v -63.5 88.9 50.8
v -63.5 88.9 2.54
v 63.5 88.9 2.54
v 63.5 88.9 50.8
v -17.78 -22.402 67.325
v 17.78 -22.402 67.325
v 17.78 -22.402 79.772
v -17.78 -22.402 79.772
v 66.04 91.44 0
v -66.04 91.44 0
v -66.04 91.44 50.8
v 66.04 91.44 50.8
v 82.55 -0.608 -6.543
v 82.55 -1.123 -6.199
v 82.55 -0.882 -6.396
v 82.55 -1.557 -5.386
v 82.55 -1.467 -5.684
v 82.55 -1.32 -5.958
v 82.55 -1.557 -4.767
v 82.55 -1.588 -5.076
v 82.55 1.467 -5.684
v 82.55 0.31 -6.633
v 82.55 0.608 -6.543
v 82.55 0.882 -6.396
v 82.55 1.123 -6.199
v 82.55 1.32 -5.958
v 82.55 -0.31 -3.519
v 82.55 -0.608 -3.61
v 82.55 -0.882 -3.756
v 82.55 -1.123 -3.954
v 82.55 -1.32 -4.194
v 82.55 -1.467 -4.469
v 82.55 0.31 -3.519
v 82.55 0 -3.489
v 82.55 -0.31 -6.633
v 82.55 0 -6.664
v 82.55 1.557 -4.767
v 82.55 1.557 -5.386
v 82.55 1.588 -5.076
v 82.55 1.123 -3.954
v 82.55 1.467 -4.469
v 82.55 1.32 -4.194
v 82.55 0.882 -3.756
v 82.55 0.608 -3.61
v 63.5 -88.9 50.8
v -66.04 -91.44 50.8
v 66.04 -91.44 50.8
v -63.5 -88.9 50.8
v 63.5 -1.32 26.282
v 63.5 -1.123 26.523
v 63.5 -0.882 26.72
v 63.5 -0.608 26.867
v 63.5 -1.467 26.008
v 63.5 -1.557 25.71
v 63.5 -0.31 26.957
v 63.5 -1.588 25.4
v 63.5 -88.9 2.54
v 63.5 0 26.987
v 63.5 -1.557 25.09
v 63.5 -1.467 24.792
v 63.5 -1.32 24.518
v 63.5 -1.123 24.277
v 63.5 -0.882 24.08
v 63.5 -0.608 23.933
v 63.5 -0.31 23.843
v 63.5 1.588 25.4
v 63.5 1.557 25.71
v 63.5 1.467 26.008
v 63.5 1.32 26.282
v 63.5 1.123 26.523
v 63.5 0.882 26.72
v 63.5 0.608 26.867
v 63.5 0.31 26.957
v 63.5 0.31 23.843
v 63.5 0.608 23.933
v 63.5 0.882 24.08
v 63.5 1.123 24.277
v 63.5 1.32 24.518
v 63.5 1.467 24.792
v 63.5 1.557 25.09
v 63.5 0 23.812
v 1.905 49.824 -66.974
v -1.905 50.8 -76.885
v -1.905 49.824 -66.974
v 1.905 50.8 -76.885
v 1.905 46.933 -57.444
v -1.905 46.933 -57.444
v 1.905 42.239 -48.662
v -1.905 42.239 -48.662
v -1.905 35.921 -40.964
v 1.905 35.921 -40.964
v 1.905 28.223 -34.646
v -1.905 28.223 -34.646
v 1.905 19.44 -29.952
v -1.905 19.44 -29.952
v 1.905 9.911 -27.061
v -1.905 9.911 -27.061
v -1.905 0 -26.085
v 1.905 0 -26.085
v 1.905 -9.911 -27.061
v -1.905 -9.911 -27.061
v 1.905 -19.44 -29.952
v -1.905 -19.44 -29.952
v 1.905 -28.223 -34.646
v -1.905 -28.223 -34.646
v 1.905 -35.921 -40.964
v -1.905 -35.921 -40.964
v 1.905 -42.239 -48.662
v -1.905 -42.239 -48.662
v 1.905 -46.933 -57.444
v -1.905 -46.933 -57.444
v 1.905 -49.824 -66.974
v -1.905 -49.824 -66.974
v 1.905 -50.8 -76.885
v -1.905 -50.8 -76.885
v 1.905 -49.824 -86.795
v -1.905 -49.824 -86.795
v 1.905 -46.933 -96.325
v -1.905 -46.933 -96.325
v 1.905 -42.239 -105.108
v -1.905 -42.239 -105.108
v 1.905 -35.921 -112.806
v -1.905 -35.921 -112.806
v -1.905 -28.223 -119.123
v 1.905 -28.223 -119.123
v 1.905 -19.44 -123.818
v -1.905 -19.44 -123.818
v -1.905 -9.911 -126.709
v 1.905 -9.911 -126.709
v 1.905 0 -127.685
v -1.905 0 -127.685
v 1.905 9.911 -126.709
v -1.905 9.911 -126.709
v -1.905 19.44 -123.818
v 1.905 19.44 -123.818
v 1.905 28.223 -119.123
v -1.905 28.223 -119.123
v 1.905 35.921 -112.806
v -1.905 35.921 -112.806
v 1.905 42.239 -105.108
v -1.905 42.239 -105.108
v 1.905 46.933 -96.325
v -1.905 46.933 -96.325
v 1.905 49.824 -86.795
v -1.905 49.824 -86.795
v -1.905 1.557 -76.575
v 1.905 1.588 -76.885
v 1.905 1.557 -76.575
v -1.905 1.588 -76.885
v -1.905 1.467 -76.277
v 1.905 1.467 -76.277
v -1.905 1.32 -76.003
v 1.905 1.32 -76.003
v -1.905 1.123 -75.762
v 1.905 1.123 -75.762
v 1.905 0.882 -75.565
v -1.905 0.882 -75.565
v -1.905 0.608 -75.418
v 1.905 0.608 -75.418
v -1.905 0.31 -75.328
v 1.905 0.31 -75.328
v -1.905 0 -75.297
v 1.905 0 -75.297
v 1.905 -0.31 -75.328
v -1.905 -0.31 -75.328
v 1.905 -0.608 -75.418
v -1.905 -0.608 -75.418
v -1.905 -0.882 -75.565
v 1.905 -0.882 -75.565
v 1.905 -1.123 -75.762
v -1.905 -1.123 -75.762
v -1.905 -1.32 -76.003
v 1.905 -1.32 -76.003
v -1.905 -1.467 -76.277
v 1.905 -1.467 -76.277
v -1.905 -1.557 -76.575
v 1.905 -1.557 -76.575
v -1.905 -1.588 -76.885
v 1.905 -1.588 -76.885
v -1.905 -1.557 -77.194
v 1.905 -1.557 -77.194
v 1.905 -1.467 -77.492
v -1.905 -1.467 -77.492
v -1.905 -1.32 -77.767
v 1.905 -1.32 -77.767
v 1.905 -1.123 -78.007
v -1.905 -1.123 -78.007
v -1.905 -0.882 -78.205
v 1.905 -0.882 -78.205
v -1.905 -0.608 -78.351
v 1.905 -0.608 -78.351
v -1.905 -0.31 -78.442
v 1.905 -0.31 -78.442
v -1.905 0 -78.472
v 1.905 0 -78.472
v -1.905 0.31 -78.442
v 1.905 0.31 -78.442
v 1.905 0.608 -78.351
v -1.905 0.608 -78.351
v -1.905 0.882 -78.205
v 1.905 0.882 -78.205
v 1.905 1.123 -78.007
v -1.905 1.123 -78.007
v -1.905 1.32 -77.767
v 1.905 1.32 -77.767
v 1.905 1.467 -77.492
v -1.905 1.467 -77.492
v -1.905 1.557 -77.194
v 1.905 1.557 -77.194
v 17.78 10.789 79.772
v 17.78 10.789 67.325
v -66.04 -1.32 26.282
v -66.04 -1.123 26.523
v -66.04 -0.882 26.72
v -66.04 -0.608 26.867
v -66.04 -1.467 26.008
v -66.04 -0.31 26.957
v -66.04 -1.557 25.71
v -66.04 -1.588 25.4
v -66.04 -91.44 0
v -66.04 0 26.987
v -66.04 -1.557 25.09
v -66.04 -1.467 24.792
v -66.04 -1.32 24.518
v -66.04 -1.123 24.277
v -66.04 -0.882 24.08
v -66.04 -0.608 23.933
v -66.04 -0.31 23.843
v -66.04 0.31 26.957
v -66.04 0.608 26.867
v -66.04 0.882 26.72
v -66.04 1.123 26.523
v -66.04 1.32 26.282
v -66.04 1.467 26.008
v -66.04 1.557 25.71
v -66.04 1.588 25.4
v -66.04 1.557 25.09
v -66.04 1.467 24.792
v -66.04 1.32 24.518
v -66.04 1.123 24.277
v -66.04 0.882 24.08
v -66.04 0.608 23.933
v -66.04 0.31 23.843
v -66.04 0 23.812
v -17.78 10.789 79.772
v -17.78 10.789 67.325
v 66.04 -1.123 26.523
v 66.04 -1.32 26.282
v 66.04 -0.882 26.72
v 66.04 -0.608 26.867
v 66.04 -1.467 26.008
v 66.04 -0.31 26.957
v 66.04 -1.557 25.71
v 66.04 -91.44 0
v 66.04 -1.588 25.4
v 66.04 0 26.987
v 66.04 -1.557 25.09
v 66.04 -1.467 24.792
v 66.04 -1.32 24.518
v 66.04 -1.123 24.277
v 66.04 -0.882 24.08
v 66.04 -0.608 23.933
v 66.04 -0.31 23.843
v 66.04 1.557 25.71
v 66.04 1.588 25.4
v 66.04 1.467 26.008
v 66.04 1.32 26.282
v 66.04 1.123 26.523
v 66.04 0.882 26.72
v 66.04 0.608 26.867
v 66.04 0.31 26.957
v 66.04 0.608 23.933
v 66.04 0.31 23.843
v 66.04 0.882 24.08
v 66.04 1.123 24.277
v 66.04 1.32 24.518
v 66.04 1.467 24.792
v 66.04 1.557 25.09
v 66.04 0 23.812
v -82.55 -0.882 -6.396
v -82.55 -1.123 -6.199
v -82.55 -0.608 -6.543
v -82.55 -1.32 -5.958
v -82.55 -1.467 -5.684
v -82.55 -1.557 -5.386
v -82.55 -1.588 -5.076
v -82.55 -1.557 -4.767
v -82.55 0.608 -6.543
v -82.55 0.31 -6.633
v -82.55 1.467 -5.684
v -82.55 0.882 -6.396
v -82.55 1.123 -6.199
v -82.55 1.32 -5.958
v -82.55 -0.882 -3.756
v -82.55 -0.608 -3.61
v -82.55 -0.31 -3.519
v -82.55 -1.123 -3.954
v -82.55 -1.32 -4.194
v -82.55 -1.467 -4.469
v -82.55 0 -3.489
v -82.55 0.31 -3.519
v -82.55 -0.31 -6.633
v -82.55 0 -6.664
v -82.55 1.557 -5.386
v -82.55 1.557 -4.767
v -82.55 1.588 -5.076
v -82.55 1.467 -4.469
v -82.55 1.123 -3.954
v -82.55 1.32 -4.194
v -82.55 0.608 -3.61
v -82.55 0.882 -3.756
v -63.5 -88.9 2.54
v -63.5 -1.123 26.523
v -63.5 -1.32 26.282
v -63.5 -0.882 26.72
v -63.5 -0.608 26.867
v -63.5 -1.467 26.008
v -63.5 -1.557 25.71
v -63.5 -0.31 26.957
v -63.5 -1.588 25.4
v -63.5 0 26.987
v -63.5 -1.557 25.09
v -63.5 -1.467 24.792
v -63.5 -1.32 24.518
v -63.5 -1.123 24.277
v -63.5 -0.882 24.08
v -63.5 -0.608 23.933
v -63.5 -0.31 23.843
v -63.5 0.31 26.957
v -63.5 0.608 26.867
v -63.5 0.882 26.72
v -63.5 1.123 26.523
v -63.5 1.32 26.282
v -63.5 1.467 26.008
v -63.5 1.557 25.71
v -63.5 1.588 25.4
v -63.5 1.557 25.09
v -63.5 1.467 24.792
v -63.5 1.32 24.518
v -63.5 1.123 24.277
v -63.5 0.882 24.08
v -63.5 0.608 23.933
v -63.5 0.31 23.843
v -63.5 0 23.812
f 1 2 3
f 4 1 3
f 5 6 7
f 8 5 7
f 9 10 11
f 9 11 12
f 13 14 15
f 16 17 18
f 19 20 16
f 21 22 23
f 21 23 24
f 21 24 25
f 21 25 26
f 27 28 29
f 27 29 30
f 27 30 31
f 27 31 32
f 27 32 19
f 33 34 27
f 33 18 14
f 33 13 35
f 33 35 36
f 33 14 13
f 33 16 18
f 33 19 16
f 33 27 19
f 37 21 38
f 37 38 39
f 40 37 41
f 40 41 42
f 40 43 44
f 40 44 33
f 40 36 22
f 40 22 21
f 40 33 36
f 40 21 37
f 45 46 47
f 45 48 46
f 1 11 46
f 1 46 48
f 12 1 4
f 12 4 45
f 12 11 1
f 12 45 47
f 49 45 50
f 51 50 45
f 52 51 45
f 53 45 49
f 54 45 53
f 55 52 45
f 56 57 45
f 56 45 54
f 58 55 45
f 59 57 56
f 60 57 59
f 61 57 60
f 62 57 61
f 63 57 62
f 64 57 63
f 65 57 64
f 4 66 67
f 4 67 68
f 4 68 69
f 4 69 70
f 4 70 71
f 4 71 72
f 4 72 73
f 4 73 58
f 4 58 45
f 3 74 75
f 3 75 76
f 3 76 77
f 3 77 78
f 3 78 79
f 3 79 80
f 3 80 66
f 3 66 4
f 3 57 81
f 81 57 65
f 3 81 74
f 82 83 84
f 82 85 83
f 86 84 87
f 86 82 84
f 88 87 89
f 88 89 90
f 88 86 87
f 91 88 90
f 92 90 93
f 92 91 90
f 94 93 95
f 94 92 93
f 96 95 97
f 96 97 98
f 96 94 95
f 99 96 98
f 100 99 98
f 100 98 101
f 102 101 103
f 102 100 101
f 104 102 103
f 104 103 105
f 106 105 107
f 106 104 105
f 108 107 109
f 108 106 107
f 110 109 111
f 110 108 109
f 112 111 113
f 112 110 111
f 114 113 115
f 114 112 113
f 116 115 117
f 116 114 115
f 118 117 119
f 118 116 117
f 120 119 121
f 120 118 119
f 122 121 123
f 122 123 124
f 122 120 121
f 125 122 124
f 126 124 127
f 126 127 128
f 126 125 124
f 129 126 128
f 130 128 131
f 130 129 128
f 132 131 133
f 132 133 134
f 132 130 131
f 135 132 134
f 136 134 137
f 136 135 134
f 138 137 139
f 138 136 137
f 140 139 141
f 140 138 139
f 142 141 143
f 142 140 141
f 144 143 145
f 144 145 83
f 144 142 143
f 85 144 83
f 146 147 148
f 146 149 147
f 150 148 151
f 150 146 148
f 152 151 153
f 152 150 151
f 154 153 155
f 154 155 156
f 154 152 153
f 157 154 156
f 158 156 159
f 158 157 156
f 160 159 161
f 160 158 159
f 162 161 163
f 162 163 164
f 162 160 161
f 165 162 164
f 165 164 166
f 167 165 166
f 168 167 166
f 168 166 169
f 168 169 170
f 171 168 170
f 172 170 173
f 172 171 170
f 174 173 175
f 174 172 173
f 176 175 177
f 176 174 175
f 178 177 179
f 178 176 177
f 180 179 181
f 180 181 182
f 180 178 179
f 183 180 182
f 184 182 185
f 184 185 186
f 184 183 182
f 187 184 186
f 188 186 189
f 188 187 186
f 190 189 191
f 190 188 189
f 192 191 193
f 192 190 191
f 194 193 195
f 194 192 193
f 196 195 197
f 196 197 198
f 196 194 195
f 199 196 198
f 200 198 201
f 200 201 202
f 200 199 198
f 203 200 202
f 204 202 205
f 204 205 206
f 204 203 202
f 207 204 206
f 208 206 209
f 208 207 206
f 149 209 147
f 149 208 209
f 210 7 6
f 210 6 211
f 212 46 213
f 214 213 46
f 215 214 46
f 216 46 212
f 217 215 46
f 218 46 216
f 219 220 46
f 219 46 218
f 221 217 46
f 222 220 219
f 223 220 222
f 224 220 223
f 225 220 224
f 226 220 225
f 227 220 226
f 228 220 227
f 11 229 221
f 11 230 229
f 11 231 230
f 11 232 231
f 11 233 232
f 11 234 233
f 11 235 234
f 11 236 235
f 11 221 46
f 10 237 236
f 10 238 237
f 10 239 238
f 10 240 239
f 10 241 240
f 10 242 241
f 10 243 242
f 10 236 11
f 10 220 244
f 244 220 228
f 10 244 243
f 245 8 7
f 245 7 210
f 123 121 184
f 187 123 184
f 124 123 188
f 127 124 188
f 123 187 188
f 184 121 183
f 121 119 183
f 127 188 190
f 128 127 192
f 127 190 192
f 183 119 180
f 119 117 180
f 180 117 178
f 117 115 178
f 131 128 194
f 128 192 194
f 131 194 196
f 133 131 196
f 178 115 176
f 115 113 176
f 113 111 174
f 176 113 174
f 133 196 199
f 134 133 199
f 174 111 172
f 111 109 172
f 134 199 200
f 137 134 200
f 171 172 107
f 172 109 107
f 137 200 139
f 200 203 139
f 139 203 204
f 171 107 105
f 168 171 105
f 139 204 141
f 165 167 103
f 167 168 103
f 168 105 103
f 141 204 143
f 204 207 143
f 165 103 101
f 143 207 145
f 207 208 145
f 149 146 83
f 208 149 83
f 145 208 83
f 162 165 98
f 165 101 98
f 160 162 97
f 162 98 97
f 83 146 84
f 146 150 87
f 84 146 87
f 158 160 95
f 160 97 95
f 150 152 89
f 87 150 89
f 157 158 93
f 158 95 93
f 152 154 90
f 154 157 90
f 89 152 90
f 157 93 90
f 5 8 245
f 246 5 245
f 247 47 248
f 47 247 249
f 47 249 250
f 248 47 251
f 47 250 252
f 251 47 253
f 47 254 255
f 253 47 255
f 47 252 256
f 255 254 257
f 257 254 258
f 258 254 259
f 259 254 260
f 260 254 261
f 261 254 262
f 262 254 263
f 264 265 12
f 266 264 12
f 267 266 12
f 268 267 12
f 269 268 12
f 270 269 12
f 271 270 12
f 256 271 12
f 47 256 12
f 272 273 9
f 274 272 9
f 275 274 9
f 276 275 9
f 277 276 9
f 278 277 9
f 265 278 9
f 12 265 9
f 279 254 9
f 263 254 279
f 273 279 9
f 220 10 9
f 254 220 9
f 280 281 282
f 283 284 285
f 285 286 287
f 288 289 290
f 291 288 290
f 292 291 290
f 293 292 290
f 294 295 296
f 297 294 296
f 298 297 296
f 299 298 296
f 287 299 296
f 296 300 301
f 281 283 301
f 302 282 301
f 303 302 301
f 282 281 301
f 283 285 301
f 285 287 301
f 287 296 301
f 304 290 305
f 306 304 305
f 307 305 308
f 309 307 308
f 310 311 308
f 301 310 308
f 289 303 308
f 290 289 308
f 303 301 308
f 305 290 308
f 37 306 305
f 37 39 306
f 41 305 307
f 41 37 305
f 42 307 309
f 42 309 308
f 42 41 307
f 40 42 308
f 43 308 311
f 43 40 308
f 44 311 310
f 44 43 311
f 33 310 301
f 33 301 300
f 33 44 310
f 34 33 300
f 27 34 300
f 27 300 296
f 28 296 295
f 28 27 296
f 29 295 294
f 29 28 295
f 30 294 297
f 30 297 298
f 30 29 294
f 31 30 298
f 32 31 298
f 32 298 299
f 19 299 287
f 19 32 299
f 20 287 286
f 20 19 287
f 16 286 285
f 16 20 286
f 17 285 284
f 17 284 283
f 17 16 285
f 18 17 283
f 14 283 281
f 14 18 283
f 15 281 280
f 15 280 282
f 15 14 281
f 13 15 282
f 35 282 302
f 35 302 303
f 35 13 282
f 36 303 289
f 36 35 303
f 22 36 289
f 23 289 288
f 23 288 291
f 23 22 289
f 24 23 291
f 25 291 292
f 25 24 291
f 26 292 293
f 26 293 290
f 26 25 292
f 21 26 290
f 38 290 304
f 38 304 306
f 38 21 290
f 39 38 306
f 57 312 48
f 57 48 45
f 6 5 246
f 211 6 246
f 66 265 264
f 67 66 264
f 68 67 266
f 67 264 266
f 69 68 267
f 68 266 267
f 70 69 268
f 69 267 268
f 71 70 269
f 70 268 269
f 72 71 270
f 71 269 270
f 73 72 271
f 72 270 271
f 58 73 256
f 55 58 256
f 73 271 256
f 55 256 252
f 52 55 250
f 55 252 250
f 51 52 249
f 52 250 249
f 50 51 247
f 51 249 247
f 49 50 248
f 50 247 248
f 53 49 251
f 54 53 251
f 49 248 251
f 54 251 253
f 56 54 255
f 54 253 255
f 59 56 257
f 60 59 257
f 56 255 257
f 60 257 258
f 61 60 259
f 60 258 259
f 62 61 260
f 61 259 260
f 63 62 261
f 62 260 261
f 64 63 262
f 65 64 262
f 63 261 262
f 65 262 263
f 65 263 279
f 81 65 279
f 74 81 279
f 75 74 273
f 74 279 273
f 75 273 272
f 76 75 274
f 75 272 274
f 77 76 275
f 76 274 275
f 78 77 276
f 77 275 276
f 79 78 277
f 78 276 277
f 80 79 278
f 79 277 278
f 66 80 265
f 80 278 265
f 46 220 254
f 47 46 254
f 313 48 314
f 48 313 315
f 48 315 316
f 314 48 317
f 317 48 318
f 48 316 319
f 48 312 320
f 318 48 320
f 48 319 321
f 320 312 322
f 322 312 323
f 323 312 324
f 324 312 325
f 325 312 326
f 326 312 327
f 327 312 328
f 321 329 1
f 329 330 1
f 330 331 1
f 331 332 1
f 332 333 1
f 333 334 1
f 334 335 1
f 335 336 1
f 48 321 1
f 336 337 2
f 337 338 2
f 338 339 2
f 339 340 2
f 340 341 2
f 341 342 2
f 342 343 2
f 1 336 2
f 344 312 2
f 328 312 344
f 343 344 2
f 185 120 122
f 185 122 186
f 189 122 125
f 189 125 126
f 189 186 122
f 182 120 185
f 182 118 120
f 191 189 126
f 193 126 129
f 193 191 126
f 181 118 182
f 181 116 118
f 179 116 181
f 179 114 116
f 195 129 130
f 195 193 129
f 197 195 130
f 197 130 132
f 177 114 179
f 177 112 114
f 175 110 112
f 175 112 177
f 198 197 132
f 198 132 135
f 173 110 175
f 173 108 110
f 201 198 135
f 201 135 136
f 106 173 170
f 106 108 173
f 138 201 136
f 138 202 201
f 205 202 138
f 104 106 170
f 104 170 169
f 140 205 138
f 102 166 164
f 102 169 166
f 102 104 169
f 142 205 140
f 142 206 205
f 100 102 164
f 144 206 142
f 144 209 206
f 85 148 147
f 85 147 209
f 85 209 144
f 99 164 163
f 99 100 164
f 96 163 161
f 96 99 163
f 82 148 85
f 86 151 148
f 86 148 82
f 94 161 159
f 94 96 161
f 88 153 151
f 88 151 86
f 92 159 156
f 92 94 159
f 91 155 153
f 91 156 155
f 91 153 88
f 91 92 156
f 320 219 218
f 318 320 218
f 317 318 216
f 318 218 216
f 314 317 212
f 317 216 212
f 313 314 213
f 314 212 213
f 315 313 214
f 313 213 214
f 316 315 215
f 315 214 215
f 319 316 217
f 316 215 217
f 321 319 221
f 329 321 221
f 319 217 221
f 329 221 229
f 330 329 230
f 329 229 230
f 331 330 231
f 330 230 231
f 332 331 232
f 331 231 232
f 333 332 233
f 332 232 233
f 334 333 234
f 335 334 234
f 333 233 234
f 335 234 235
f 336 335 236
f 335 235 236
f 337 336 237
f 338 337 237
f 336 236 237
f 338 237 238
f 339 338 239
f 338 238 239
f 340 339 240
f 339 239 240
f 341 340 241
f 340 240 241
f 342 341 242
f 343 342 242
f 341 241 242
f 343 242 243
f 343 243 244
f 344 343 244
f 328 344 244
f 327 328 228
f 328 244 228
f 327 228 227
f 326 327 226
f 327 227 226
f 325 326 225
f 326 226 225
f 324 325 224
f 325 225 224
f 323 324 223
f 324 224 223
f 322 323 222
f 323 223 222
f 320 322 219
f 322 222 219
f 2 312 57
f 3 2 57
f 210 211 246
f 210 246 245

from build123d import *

# Parameters (mm, degrees)
F0_W      = 127
F0_H      = 177.8
F1_DEPTH  = 2.54
F0_W_2    = 132.08
F0_H_2    = 182.88
F2_DEPTH  = 50.8
F3_R      = 1.5875
F4_DEPTH  = 2.54
F5_R      = 1.5875
F6_DEPTH  = 2.54
F7_R      = 1.5875
F8_DEPTH  = 82.55
F9_R      = 50.8
F9_R_2    = 1.5875
F10_DEPTH = 1.905
F11_W     = 33.191652
F11_H     = 12.446872
F12_DEPTH = 17.78


with BuildPart() as f1:
    # F0 (on Top) → F1 (new body)
    with BuildSketch(Plane.XY):
        Rectangle(F0_W, F0_H)
    extrude(amount=F1_DEPTH)

    # F0 (on Top) → F2 (join)
    with BuildSketch(Plane.XY):
        Rectangle(F0_W_2, F0_H_2)
        Rectangle(F0_W, F0_H, mode=Mode.SUBTRACT)
    extrude(amount=F2_DEPTH)

    # F3 (on face) → F4 (cut)
    with BuildSketch(Plane.YZ.offset(66.04)):
        with Locations((0, 25.4)):
            Circle(F3_R)
    extrude(amount=-F4_DEPTH, mode=Mode.SUBTRACT)

    # F5 (on face) → F6 (cut)
    with BuildSketch(Plane(origin=(-66.04, 0, 0), x_dir=(0, -1, 0), z_dir=(-1, 0, 0))):
        with Locations((0, 25.4)):
            Circle(F5_R)
    extrude(amount=-F6_DEPTH, mode=Mode.SUBTRACT)


with BuildPart() as f8:
    # F7 (on Right) → F8 (new body, symmetric)
    with BuildSketch(Plane.YZ):
        with Locations((0, -5.076386)):
            Circle(F7_R)
    extrude(amount=F8_DEPTH, both=True)


with BuildPart() as f10:
    # F9 (on Right) → F10 (new body, symmetric)
    with BuildSketch(Plane.YZ):
        with Locations((0, -76.884641)):
            Circle(F9_R)
        with Locations((0, -76.884641)):
            Circle(F9_R_2, mode=Mode.SUBTRACT)
    extrude(amount=F10_DEPTH, both=True)


with BuildPart() as f12:
    # F11 (on Right) → F12 (new body, symmetric)
    with BuildSketch(Plane.YZ):
        with Locations((-5.806401, 73.548127)):
            Rectangle(F11_W, F11_H)
    extrude(amount=F12_DEPTH, both=True)


solid = Compound([f1.part, f8.part, f10.part, f12.part])
